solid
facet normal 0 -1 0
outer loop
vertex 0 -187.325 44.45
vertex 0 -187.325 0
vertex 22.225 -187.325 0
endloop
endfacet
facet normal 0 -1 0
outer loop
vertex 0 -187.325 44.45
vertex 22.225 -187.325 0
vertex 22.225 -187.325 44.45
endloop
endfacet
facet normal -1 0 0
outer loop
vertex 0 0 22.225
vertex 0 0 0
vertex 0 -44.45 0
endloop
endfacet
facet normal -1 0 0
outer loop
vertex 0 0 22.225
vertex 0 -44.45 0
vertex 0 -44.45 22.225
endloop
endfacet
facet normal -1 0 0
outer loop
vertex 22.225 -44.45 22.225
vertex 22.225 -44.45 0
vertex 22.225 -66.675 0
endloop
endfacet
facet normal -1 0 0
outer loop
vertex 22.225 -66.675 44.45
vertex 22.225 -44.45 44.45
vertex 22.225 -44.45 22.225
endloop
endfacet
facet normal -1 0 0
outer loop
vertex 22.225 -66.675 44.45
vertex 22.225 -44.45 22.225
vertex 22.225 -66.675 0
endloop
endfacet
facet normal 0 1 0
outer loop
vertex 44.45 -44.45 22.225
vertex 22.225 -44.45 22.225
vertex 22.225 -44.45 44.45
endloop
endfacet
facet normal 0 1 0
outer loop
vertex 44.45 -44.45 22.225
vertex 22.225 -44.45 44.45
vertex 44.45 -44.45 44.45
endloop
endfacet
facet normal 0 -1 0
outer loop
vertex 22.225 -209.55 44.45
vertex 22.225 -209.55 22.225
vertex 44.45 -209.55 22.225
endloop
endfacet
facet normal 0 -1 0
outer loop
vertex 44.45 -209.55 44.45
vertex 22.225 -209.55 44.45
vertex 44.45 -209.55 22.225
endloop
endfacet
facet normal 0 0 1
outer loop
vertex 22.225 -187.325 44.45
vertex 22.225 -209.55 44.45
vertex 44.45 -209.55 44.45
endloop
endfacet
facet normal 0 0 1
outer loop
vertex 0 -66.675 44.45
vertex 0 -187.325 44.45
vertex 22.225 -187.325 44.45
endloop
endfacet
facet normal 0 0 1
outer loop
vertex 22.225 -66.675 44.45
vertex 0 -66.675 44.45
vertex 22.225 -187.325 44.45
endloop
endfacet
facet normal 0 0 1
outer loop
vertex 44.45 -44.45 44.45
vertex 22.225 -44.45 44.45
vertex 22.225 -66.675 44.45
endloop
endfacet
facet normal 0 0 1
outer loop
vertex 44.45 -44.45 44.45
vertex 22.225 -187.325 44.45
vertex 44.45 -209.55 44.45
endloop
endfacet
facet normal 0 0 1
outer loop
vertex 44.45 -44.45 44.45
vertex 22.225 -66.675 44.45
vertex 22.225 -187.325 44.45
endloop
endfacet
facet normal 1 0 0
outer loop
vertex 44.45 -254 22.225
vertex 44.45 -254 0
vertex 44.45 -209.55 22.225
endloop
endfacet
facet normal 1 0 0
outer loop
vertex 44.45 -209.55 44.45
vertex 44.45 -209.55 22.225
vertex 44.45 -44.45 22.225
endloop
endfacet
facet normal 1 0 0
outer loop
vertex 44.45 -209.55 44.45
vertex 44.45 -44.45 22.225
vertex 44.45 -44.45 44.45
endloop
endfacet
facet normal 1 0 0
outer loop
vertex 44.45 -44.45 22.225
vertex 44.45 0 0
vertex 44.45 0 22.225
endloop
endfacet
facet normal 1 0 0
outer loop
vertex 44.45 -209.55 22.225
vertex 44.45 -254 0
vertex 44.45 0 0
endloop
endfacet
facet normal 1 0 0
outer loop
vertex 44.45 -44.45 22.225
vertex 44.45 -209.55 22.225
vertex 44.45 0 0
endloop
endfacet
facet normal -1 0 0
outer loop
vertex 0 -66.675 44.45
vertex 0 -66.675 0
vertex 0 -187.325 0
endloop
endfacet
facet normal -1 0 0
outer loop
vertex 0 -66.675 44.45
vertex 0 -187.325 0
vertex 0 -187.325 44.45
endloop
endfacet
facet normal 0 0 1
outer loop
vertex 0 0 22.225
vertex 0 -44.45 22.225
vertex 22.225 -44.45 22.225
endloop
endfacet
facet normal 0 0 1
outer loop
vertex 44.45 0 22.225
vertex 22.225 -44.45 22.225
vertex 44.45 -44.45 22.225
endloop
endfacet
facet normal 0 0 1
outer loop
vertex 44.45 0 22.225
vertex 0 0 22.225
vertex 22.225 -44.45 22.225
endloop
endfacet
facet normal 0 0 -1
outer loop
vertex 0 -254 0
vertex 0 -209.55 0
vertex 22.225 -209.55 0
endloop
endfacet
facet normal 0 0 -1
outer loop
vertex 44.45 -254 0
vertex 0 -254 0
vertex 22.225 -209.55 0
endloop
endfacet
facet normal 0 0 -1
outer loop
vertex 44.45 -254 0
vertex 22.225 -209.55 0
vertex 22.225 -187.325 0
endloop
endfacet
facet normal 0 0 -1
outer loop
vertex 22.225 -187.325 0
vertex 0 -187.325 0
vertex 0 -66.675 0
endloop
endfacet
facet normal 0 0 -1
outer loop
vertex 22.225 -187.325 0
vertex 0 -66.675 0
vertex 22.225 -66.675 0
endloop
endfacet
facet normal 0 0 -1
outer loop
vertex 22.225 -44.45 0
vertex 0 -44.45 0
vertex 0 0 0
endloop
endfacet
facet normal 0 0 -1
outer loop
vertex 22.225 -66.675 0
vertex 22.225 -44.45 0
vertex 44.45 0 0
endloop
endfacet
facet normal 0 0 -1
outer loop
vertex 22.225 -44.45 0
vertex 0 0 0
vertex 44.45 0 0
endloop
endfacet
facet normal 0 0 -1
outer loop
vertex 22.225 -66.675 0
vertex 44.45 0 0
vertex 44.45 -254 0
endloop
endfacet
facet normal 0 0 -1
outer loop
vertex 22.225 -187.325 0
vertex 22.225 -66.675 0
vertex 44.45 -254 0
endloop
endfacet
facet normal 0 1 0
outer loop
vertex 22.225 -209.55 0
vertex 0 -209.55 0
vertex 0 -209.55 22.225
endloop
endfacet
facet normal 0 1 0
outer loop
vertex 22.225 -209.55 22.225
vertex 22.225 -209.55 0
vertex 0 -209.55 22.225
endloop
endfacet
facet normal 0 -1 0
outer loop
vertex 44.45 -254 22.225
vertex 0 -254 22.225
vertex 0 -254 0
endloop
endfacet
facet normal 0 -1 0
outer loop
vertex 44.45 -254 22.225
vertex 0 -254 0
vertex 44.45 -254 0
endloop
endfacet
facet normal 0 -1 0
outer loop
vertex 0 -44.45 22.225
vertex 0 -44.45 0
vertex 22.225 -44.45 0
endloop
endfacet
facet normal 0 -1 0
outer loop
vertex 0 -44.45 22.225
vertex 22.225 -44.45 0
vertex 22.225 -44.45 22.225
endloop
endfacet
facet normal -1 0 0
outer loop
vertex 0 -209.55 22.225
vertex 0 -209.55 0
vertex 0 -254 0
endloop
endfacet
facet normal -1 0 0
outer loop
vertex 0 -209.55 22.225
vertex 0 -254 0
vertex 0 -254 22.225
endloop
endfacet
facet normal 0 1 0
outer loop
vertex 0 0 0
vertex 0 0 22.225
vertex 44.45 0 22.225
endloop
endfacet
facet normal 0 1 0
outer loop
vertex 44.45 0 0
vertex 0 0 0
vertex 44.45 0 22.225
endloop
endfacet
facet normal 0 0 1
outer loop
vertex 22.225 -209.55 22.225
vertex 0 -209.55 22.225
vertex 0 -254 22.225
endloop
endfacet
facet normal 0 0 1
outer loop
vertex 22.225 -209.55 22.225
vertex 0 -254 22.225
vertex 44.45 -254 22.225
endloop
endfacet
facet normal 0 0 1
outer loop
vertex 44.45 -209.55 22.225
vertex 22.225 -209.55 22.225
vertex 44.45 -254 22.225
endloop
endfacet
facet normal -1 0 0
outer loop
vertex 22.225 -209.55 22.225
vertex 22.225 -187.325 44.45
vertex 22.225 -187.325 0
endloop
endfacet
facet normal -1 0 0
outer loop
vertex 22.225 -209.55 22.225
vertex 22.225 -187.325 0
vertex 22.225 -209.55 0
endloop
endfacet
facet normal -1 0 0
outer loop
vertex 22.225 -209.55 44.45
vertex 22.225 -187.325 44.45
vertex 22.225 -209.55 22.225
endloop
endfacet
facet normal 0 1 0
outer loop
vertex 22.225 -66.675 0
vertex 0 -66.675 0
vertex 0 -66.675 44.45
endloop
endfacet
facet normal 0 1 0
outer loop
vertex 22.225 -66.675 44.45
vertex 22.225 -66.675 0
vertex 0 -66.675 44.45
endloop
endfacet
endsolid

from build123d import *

# Parameters (mm, degrees)
F0_W     = 44.45
F0_H     = 44.45
F1_DEPTH = 254
F2_W     = 44.45
F2_H     = 44.45
F3_DEPTH = 22.225
F4_W     = 22.225
F4_H     = 44.45
F5_DEPTH = 22.225


with BuildPart() as f1:
    # F0 (on Front) → F1 (new body)
    with BuildSketch(Plane.XZ):
        with Locations((22.225, 22.225)):
            Rectangle(F0_W, F0_H)
    extrude(amount=F1_DEPTH)

    # F2 (on face) → F3 (cut)
    with BuildSketch(Plane.XY.offset(44.45)):
        with Locations((22.225, -231.775)):
            Rectangle(F2_W, F2_H)
        with Locations((22.225, -22.225)):
            Rectangle(F2_W, F2_H)
    extrude(amount=-F3_DEPTH, mode=Mode.SUBTRACT)

    # F4 (on face) → F5 (cut)
    with BuildSketch(Plane(origin=(0, 0, 0), x_dir=(0, -1, 0), z_dir=(-1, 0, 0))):
        with Locations((55.5625, 22.225)):
            Rectangle(F4_W, F4_H)
        with Locations((198.4375, 22.225)):
            Rectangle(F4_W, F4_H)
    extrude(amount=-F5_DEPTH, mode=Mode.SUBTRACT)


solid = f1.part
